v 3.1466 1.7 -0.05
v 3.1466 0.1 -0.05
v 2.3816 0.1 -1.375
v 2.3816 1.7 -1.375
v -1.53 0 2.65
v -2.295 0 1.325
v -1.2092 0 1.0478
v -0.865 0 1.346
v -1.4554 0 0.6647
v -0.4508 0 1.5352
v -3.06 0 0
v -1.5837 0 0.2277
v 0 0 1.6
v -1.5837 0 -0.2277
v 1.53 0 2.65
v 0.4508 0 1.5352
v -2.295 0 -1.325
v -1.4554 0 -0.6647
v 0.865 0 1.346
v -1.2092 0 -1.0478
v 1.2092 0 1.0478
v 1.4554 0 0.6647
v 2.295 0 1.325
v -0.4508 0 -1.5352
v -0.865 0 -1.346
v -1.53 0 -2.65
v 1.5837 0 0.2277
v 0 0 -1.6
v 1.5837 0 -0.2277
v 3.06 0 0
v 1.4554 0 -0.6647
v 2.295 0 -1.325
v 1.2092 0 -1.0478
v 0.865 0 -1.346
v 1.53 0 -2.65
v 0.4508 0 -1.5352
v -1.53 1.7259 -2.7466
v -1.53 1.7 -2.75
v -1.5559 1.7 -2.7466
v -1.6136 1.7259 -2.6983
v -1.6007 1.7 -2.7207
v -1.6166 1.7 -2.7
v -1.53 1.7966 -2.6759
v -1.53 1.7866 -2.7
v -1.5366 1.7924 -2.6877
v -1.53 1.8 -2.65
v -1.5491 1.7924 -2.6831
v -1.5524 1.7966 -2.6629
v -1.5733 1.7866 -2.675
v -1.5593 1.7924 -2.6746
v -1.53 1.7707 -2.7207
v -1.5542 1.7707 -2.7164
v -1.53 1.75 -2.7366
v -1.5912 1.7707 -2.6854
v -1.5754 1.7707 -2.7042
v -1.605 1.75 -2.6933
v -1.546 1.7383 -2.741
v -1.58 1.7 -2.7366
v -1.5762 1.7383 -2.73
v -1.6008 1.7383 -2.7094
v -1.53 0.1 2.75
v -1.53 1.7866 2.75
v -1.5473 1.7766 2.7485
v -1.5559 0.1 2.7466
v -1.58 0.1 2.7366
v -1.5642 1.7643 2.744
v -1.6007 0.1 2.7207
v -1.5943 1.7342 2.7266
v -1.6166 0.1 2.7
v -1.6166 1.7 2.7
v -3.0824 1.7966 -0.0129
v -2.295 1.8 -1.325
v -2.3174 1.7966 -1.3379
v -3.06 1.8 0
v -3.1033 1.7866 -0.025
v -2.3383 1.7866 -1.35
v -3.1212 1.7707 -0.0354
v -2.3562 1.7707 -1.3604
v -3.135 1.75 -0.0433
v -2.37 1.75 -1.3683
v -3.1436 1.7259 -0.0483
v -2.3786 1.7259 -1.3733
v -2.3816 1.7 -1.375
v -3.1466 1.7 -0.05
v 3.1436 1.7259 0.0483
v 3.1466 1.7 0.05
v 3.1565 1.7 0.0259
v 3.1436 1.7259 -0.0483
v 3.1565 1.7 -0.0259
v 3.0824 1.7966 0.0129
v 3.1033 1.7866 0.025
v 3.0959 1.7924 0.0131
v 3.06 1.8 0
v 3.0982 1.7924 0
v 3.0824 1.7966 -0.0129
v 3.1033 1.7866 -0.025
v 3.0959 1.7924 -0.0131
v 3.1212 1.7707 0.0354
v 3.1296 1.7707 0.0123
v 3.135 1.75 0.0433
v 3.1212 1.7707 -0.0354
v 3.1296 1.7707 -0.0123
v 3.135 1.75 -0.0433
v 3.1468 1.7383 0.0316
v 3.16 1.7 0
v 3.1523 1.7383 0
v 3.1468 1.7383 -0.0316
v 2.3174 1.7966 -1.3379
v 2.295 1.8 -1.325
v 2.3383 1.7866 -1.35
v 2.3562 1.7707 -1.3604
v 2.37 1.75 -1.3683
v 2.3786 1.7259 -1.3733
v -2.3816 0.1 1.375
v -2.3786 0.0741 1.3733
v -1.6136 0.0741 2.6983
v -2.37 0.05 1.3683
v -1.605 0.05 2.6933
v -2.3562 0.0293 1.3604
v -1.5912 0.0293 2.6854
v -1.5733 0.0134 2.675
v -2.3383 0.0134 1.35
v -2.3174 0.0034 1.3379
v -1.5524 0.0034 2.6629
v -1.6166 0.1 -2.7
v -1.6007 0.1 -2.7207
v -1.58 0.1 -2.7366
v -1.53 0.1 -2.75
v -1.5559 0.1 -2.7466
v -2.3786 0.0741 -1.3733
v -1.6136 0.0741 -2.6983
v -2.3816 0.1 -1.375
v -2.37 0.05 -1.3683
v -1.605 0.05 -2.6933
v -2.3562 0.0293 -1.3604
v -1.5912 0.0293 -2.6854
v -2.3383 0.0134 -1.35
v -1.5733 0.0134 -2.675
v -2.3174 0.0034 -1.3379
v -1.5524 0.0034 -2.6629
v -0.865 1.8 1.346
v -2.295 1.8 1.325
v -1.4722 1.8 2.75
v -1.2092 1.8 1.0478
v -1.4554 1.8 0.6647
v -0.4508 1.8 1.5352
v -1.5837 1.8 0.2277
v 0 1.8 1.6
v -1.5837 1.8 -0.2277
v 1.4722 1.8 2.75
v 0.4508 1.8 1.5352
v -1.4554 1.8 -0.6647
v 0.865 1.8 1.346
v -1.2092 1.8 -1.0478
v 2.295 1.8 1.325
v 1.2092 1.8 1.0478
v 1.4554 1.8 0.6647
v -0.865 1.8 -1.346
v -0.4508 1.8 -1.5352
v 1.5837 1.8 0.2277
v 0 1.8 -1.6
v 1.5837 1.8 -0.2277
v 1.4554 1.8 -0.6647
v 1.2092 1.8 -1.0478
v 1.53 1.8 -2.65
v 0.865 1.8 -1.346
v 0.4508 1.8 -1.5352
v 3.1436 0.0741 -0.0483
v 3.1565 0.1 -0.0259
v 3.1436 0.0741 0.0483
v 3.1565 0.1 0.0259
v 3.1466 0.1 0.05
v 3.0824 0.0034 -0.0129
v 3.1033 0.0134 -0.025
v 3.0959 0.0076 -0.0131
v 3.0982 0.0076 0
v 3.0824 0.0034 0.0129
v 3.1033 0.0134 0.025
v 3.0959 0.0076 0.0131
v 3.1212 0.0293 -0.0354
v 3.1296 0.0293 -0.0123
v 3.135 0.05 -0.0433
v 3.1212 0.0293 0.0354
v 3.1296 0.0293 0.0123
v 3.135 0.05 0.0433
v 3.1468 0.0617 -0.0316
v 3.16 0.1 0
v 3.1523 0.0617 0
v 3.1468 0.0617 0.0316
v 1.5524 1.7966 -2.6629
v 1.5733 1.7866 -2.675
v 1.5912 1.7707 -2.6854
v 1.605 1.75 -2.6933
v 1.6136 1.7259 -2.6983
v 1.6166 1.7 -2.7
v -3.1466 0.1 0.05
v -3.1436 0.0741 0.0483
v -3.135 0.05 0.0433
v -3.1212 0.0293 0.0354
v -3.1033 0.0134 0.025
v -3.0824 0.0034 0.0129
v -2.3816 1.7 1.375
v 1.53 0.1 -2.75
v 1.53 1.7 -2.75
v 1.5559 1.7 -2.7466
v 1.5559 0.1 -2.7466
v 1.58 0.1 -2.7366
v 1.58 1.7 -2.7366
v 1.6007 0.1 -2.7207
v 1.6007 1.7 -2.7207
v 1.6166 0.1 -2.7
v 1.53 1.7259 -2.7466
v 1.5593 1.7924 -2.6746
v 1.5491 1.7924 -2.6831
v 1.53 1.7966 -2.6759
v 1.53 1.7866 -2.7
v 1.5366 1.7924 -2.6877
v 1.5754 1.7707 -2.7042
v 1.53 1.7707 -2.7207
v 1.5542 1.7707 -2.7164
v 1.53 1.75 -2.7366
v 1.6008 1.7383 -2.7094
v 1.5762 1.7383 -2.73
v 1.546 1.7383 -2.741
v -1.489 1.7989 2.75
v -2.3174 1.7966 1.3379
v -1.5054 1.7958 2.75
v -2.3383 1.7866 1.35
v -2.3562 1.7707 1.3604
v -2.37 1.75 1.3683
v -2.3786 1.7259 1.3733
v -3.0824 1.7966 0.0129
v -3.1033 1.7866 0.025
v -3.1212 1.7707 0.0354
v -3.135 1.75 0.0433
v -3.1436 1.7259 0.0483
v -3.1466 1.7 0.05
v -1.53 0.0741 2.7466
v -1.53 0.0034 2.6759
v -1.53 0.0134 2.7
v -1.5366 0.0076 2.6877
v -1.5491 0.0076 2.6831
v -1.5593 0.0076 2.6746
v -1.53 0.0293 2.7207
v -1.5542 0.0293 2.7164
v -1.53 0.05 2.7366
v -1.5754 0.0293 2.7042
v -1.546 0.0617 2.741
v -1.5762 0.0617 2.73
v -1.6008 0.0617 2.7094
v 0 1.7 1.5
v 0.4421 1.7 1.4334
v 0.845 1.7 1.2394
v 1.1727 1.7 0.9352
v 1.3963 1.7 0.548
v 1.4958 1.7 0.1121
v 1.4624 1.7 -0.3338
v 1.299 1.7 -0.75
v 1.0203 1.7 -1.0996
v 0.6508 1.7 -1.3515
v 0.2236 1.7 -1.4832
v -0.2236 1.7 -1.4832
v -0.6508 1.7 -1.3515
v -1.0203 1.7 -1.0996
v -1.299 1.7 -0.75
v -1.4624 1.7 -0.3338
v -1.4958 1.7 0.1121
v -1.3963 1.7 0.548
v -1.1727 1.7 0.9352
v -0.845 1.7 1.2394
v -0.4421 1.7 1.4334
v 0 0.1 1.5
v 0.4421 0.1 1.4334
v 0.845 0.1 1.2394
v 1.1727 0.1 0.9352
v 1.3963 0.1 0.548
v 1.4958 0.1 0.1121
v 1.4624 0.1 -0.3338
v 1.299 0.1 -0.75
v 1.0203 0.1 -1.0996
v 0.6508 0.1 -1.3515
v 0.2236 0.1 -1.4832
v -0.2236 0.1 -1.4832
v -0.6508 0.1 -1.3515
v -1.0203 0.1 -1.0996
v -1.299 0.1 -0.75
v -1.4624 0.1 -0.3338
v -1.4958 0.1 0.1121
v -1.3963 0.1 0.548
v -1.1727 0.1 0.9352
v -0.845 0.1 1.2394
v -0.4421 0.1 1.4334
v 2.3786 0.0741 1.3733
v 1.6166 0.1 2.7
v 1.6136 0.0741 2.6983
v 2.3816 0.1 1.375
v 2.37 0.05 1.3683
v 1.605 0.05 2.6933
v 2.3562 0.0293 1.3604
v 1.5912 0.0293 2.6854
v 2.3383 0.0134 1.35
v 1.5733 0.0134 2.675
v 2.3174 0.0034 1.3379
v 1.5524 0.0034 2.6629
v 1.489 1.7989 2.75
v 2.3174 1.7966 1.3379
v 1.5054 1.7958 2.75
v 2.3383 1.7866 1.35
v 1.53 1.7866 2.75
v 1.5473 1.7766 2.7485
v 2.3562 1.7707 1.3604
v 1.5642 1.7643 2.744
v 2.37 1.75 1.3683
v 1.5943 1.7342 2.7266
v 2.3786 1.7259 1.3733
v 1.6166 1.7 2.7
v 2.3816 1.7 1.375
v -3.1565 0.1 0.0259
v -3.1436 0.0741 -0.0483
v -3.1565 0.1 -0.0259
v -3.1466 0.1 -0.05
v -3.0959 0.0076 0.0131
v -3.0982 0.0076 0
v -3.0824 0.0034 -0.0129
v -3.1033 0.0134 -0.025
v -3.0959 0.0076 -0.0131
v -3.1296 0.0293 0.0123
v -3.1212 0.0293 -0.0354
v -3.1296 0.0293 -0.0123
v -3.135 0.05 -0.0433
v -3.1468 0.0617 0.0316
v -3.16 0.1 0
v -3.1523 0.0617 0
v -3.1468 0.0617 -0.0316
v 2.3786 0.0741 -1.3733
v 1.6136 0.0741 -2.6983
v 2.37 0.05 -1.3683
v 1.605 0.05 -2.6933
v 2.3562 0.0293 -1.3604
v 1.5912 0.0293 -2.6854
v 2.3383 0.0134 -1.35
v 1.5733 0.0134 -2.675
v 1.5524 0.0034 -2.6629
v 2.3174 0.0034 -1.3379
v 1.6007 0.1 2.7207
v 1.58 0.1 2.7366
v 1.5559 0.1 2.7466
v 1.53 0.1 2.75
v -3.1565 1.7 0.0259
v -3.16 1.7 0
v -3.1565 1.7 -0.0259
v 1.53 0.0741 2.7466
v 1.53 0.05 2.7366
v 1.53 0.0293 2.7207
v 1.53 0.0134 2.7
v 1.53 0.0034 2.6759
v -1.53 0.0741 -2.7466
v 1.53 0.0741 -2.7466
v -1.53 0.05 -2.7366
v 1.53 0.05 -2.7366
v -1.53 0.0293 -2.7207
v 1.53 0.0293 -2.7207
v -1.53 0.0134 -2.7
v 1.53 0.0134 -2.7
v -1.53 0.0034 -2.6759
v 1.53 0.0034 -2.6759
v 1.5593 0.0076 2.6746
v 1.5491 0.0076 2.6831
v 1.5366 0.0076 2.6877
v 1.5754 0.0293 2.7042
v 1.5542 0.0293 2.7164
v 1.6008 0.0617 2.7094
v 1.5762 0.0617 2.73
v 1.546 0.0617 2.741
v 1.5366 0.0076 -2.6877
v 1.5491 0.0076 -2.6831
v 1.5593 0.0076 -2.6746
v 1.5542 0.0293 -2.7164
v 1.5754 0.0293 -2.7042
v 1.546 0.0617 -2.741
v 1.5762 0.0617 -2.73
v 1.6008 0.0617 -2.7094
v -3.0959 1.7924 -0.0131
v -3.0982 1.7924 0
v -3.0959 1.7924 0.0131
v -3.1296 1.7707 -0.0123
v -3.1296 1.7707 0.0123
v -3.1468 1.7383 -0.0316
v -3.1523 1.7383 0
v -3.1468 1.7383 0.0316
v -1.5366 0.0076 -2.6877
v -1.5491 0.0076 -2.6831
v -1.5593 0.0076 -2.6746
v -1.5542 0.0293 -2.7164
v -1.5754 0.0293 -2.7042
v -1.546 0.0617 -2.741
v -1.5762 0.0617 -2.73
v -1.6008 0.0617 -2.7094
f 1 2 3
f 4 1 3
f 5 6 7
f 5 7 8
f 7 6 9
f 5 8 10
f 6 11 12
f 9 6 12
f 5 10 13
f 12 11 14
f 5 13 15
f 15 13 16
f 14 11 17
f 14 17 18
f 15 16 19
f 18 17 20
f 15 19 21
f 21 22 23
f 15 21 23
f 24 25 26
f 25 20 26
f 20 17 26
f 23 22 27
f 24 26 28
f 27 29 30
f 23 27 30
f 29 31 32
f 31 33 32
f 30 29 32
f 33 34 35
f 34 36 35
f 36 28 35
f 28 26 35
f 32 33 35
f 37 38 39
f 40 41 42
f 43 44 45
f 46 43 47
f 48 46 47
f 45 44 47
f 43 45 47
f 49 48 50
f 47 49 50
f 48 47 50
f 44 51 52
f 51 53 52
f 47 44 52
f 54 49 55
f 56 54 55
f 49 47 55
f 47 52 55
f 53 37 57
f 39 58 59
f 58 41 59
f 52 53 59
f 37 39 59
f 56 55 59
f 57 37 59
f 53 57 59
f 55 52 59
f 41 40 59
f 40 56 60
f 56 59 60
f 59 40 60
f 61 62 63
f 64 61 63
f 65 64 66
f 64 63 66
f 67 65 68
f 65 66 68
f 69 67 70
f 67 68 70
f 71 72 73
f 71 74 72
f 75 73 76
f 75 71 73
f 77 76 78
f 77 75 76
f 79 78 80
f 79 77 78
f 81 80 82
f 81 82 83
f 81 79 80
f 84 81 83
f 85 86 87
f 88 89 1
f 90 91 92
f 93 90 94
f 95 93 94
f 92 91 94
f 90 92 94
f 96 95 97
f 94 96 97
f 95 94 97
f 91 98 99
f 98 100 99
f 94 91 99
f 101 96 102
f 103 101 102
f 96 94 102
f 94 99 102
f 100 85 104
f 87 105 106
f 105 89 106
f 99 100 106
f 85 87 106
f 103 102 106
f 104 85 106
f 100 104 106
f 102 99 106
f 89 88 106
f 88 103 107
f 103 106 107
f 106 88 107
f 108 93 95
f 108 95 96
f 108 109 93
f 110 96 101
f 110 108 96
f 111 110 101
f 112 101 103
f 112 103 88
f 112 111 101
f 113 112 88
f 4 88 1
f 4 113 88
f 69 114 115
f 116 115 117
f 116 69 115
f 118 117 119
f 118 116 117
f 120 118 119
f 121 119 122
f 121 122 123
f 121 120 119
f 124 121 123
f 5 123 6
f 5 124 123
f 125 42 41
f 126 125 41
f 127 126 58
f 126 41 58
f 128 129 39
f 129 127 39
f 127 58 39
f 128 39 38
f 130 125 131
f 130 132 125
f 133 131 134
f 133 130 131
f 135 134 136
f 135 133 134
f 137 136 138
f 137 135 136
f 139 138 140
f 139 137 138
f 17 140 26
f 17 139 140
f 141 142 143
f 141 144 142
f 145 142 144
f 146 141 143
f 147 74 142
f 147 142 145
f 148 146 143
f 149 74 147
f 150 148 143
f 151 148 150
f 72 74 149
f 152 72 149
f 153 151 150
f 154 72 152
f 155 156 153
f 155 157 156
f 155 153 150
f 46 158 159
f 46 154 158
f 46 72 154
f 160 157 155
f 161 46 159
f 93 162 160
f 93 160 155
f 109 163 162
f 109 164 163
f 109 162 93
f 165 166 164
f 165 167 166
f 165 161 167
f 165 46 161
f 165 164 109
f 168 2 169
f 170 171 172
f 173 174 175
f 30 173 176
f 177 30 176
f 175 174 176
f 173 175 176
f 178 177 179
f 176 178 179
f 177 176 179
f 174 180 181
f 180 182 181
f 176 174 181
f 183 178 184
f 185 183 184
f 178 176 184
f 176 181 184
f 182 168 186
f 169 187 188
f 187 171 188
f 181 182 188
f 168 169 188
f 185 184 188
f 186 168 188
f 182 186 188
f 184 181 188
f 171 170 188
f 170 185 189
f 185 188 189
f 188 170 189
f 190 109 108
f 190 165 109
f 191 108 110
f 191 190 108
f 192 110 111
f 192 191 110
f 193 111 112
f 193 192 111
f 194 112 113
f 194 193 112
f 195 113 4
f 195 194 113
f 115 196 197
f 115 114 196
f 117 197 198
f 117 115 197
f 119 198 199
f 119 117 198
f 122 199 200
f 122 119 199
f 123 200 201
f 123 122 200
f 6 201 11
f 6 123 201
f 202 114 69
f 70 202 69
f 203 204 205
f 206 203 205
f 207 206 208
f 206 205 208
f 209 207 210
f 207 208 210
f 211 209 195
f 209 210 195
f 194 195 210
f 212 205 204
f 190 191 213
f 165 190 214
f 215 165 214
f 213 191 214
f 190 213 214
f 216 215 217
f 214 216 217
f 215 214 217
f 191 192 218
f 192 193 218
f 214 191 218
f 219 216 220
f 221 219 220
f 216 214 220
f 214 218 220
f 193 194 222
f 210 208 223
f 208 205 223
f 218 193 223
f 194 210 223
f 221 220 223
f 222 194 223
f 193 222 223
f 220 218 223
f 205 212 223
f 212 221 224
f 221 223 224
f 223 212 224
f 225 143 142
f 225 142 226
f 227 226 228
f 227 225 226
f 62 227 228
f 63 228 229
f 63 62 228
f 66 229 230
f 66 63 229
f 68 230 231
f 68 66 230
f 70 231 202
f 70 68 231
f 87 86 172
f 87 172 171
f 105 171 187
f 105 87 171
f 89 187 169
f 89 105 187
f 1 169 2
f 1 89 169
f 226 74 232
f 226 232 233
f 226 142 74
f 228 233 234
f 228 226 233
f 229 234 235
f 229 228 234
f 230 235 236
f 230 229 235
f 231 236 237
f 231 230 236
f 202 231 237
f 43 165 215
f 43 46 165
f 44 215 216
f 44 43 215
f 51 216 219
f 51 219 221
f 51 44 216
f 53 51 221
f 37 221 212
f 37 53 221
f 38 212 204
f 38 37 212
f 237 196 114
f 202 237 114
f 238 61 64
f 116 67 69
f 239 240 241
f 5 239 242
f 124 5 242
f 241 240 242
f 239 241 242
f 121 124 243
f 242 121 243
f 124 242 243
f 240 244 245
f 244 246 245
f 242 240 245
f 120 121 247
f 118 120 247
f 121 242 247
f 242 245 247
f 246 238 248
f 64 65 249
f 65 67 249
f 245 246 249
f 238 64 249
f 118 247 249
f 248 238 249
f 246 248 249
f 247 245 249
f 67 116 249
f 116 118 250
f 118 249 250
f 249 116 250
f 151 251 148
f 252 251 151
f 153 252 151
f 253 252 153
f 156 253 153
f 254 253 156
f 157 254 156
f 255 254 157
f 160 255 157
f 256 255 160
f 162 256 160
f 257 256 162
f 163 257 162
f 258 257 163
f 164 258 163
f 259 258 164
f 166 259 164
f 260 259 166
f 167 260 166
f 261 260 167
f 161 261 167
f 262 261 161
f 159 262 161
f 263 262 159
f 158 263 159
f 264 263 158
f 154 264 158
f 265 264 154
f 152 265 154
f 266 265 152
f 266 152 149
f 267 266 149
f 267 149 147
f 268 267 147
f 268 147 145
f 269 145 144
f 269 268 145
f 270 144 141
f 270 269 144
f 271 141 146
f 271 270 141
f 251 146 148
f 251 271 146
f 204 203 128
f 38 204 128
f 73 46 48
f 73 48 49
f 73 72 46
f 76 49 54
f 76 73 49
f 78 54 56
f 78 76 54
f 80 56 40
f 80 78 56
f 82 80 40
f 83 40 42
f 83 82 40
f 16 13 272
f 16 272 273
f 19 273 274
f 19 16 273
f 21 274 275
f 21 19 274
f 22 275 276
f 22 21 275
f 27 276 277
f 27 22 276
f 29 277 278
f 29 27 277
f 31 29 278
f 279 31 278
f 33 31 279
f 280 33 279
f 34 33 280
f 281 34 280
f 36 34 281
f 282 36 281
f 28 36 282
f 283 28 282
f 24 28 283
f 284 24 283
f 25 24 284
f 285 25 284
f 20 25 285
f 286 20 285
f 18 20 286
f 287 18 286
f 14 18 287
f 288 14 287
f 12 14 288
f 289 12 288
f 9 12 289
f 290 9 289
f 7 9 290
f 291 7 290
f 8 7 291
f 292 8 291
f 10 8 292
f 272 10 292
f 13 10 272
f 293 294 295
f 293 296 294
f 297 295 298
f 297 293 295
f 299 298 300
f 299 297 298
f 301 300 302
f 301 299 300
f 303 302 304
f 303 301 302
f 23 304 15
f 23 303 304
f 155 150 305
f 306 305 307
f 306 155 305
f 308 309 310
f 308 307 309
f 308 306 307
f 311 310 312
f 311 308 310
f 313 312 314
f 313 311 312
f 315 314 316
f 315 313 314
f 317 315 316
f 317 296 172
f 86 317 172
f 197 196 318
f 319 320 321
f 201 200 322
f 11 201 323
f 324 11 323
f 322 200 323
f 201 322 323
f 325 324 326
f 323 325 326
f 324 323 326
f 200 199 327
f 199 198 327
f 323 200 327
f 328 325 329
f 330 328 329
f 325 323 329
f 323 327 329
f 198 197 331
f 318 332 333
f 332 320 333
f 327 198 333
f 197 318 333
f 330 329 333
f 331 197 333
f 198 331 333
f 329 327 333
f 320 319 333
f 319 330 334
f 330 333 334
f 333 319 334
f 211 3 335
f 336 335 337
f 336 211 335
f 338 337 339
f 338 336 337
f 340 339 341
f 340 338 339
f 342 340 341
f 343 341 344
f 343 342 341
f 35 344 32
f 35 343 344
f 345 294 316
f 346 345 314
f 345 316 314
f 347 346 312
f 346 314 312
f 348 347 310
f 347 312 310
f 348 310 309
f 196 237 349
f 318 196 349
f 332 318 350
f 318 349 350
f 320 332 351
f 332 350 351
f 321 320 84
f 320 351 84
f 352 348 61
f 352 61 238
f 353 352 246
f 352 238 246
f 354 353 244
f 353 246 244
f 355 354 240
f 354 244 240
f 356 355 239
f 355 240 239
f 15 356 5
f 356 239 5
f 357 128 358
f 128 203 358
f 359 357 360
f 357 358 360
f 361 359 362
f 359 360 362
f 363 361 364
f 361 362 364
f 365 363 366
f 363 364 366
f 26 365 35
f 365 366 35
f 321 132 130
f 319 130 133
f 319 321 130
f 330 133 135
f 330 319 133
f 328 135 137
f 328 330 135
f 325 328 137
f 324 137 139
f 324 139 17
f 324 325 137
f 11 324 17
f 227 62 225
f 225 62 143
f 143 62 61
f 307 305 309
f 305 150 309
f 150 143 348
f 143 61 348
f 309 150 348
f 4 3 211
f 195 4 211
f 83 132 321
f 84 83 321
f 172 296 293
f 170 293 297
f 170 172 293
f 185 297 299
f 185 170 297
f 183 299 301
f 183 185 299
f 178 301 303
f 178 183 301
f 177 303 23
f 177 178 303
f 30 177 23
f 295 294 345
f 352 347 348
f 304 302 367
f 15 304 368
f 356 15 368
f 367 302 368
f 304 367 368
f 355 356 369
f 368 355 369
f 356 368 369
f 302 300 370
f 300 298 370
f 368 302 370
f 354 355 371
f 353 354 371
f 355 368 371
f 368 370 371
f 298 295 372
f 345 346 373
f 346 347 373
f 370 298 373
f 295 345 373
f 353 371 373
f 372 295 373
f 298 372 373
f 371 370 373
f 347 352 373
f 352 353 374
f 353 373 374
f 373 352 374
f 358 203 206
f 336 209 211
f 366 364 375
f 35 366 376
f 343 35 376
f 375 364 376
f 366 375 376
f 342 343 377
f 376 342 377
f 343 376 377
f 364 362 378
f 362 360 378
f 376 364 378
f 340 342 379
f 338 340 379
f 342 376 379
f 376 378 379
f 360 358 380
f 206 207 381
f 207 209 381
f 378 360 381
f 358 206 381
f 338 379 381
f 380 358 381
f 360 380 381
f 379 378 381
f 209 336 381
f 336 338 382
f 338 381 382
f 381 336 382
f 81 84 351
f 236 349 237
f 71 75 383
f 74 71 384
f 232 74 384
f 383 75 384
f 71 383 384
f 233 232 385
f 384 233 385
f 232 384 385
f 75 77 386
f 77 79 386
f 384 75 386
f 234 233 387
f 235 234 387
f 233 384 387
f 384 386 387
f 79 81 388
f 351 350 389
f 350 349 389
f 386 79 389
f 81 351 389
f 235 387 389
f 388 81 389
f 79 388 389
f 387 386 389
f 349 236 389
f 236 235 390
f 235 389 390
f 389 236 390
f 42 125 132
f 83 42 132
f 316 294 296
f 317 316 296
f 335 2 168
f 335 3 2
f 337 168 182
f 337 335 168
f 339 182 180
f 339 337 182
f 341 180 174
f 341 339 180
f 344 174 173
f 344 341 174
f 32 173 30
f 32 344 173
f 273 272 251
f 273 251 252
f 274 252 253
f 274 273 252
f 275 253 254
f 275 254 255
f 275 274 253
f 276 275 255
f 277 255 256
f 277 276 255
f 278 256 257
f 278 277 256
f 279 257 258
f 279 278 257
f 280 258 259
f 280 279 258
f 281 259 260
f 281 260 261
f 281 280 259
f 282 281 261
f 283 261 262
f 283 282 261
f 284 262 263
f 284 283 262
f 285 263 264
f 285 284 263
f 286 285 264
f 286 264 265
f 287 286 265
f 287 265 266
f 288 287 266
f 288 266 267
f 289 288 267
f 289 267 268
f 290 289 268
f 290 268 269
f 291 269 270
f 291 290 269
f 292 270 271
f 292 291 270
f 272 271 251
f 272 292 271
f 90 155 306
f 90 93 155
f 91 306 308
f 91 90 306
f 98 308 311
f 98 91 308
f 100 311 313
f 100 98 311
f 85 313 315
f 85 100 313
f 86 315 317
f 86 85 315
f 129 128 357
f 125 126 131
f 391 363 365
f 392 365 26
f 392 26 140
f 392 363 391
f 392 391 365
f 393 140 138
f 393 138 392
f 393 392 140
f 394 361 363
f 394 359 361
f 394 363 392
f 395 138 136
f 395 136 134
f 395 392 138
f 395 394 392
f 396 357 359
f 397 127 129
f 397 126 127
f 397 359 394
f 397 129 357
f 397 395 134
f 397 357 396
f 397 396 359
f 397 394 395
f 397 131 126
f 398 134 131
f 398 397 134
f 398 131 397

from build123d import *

# Parameters (mm, degrees)
SKETCH1_R           = 2.75
SKETCH1_R_2         = 1.5
BOSS_EXTRUDE2_DEPTH = 1.8
FILLET1_R           = 0.1
CHAMFER1_SIZE       = 0.1


with BuildPart() as part:
    # Sketch1 → Boss-Extrude2 (new body)
    # profile 1 of 7: a face of its own
    with BuildSketch(Plane(origin=(0, 0, 0), x_dir=(1, 0, 0), z_dir=(0, 1, 0))):
        with BuildLine():
            Line((0, 2.75), (-1.58771324, 2.75))
            Line((-1.58771324, 2.75), (-2.381569814, 1.37500008))
            ThreePointArc((-2.381569814, 1.37500008), (-1.37499996, 2.381569884), (0, 2.75))
        make_face()
    # profile 2 of 7: a face of its own
    with BuildSketch(Plane(origin=(0, 0, 0), x_dir=(1, 0, 0), z_dir=(0, 1, 0))):
        with BuildLine():
            ThreePointArc((-2.381569844, -1.375000029), (-2.75, 3e-08), (-2.381569814, 1.37500008))
            Line((-2.381569814, 1.37500008), (-3.175426481, 0))
            Line((-3.175426481, 0), (-2.381569844, -1.375000029))
        make_face()
    # profile 3 of 7: a face of its own
    with BuildSketch(Plane(origin=(0, 0, 0), x_dir=(1, 0, 0), z_dir=(0, 1, 0))):
        with BuildLine():
            Line((1.58771324, 2.75), (0, 2.75))
            ThreePointArc((0, 2.75), (1.374999954, 2.381569887), (2.381569807, 1.375000092))
            Line((2.381569807, 1.375000092), (1.58771324, 2.75))
        make_face()
    # profile 4 of 7: a face of its own
    with BuildSketch(Plane(origin=(0, 0, 0), x_dir=(1, 0, 0), z_dir=(0, 1, 0))):
        with BuildLine():
            Line((3.175426481, 0), (2.381569807, 1.375000092))
            ThreePointArc((2.381569807, 1.375000092), (2.656296008, 0.711752426), (2.75, 0))
            ThreePointArc((2.75, 0), (2.65629601, -0.711752419), (2.381569814, -1.37500008))
            Line((2.381569814, -1.37500008), (3.175426481, 0))
        make_face()
    # profile 5 of 7: a face of its own
    with BuildSketch(Plane(origin=(0, 0, 0), x_dir=(1, 0, 0), z_dir=(0, 1, 0))):
        with BuildLine():
            ThreePointArc((0, -2.75), (-1.374999986, -2.381569869), (-2.381569844, -1.375000029))
            Line((-2.381569844, -1.375000029), (-1.58771324, -2.75))
            Line((-1.58771324, -2.75), (0, -2.75))
        make_face()
    # profile 6 of 7: a face of its own
    with BuildSketch(Plane(origin=(0, 0, 0), x_dir=(1, 0, 0), z_dir=(0, 1, 0))):
        with BuildLine():
            ThreePointArc((2.381569814, -1.37500008), (1.37499996, -2.381569884), (0, -2.75))
            Line((0, -2.75), (1.58771324, -2.75))
            Line((1.58771324, -2.75), (2.381569814, -1.37500008))
        make_face()
    # profile 7 of 7: a face of its own
    with BuildSketch(Plane(origin=(0, 0, 0), x_dir=(1, 0, 0), z_dir=(0, 1, 0))):
        Circle(SKETCH1_R)
        with Locations(Location((0, 0, 0), (0, 0, 270))):
            Circle(SKETCH1_R_2, mode=Mode.SUBTRACT)
    extrude(amount=BOSS_EXTRUDE2_DEPTH)

    # Fillet1
    fillet1_edges = [part.edges().sort_by_distance(p)[0] for p in [
        (2.38156986, 0, -1.375),
        (2.38156986, 0, 1.375),
        (0, 0, 2.75),
        (-2.38156986, 1.8, 1.375),
        (-2.38156986, 0, 1.375),
        (-2.38156986, 0, -1.375),
        (-1.58771324, 0.9, -2.75),
        (1.58771324, 0.9, -2.75),
        (3.175426481, 0.9, 0),
        (1.58771324, 0.9, 2.75),
        (-1.58771324, 0.9, 2.75),
        (-3.175426481, 0.9, 0),
        (2.38156986, 1.8, 1.375),
        (2.38156986, 1.8, -1.375),
        (0, 1.8, -2.75),
        (-2.38156986, 1.8, -1.375),
        (0, 0, -2.75),
    ]]
    fillet(fillet1_edges, radius=FILLET1_R)

    # Chamfer1
    chamfer1_edges = [part.edges().sort_by_distance(p)[0] for p in [
        (0, 1.8, -1.5),
        (0, 0, -1.5),
    ]]
    chamfer(chamfer1_edges, length=CHAMFER1_SIZE)


solid = part.part
